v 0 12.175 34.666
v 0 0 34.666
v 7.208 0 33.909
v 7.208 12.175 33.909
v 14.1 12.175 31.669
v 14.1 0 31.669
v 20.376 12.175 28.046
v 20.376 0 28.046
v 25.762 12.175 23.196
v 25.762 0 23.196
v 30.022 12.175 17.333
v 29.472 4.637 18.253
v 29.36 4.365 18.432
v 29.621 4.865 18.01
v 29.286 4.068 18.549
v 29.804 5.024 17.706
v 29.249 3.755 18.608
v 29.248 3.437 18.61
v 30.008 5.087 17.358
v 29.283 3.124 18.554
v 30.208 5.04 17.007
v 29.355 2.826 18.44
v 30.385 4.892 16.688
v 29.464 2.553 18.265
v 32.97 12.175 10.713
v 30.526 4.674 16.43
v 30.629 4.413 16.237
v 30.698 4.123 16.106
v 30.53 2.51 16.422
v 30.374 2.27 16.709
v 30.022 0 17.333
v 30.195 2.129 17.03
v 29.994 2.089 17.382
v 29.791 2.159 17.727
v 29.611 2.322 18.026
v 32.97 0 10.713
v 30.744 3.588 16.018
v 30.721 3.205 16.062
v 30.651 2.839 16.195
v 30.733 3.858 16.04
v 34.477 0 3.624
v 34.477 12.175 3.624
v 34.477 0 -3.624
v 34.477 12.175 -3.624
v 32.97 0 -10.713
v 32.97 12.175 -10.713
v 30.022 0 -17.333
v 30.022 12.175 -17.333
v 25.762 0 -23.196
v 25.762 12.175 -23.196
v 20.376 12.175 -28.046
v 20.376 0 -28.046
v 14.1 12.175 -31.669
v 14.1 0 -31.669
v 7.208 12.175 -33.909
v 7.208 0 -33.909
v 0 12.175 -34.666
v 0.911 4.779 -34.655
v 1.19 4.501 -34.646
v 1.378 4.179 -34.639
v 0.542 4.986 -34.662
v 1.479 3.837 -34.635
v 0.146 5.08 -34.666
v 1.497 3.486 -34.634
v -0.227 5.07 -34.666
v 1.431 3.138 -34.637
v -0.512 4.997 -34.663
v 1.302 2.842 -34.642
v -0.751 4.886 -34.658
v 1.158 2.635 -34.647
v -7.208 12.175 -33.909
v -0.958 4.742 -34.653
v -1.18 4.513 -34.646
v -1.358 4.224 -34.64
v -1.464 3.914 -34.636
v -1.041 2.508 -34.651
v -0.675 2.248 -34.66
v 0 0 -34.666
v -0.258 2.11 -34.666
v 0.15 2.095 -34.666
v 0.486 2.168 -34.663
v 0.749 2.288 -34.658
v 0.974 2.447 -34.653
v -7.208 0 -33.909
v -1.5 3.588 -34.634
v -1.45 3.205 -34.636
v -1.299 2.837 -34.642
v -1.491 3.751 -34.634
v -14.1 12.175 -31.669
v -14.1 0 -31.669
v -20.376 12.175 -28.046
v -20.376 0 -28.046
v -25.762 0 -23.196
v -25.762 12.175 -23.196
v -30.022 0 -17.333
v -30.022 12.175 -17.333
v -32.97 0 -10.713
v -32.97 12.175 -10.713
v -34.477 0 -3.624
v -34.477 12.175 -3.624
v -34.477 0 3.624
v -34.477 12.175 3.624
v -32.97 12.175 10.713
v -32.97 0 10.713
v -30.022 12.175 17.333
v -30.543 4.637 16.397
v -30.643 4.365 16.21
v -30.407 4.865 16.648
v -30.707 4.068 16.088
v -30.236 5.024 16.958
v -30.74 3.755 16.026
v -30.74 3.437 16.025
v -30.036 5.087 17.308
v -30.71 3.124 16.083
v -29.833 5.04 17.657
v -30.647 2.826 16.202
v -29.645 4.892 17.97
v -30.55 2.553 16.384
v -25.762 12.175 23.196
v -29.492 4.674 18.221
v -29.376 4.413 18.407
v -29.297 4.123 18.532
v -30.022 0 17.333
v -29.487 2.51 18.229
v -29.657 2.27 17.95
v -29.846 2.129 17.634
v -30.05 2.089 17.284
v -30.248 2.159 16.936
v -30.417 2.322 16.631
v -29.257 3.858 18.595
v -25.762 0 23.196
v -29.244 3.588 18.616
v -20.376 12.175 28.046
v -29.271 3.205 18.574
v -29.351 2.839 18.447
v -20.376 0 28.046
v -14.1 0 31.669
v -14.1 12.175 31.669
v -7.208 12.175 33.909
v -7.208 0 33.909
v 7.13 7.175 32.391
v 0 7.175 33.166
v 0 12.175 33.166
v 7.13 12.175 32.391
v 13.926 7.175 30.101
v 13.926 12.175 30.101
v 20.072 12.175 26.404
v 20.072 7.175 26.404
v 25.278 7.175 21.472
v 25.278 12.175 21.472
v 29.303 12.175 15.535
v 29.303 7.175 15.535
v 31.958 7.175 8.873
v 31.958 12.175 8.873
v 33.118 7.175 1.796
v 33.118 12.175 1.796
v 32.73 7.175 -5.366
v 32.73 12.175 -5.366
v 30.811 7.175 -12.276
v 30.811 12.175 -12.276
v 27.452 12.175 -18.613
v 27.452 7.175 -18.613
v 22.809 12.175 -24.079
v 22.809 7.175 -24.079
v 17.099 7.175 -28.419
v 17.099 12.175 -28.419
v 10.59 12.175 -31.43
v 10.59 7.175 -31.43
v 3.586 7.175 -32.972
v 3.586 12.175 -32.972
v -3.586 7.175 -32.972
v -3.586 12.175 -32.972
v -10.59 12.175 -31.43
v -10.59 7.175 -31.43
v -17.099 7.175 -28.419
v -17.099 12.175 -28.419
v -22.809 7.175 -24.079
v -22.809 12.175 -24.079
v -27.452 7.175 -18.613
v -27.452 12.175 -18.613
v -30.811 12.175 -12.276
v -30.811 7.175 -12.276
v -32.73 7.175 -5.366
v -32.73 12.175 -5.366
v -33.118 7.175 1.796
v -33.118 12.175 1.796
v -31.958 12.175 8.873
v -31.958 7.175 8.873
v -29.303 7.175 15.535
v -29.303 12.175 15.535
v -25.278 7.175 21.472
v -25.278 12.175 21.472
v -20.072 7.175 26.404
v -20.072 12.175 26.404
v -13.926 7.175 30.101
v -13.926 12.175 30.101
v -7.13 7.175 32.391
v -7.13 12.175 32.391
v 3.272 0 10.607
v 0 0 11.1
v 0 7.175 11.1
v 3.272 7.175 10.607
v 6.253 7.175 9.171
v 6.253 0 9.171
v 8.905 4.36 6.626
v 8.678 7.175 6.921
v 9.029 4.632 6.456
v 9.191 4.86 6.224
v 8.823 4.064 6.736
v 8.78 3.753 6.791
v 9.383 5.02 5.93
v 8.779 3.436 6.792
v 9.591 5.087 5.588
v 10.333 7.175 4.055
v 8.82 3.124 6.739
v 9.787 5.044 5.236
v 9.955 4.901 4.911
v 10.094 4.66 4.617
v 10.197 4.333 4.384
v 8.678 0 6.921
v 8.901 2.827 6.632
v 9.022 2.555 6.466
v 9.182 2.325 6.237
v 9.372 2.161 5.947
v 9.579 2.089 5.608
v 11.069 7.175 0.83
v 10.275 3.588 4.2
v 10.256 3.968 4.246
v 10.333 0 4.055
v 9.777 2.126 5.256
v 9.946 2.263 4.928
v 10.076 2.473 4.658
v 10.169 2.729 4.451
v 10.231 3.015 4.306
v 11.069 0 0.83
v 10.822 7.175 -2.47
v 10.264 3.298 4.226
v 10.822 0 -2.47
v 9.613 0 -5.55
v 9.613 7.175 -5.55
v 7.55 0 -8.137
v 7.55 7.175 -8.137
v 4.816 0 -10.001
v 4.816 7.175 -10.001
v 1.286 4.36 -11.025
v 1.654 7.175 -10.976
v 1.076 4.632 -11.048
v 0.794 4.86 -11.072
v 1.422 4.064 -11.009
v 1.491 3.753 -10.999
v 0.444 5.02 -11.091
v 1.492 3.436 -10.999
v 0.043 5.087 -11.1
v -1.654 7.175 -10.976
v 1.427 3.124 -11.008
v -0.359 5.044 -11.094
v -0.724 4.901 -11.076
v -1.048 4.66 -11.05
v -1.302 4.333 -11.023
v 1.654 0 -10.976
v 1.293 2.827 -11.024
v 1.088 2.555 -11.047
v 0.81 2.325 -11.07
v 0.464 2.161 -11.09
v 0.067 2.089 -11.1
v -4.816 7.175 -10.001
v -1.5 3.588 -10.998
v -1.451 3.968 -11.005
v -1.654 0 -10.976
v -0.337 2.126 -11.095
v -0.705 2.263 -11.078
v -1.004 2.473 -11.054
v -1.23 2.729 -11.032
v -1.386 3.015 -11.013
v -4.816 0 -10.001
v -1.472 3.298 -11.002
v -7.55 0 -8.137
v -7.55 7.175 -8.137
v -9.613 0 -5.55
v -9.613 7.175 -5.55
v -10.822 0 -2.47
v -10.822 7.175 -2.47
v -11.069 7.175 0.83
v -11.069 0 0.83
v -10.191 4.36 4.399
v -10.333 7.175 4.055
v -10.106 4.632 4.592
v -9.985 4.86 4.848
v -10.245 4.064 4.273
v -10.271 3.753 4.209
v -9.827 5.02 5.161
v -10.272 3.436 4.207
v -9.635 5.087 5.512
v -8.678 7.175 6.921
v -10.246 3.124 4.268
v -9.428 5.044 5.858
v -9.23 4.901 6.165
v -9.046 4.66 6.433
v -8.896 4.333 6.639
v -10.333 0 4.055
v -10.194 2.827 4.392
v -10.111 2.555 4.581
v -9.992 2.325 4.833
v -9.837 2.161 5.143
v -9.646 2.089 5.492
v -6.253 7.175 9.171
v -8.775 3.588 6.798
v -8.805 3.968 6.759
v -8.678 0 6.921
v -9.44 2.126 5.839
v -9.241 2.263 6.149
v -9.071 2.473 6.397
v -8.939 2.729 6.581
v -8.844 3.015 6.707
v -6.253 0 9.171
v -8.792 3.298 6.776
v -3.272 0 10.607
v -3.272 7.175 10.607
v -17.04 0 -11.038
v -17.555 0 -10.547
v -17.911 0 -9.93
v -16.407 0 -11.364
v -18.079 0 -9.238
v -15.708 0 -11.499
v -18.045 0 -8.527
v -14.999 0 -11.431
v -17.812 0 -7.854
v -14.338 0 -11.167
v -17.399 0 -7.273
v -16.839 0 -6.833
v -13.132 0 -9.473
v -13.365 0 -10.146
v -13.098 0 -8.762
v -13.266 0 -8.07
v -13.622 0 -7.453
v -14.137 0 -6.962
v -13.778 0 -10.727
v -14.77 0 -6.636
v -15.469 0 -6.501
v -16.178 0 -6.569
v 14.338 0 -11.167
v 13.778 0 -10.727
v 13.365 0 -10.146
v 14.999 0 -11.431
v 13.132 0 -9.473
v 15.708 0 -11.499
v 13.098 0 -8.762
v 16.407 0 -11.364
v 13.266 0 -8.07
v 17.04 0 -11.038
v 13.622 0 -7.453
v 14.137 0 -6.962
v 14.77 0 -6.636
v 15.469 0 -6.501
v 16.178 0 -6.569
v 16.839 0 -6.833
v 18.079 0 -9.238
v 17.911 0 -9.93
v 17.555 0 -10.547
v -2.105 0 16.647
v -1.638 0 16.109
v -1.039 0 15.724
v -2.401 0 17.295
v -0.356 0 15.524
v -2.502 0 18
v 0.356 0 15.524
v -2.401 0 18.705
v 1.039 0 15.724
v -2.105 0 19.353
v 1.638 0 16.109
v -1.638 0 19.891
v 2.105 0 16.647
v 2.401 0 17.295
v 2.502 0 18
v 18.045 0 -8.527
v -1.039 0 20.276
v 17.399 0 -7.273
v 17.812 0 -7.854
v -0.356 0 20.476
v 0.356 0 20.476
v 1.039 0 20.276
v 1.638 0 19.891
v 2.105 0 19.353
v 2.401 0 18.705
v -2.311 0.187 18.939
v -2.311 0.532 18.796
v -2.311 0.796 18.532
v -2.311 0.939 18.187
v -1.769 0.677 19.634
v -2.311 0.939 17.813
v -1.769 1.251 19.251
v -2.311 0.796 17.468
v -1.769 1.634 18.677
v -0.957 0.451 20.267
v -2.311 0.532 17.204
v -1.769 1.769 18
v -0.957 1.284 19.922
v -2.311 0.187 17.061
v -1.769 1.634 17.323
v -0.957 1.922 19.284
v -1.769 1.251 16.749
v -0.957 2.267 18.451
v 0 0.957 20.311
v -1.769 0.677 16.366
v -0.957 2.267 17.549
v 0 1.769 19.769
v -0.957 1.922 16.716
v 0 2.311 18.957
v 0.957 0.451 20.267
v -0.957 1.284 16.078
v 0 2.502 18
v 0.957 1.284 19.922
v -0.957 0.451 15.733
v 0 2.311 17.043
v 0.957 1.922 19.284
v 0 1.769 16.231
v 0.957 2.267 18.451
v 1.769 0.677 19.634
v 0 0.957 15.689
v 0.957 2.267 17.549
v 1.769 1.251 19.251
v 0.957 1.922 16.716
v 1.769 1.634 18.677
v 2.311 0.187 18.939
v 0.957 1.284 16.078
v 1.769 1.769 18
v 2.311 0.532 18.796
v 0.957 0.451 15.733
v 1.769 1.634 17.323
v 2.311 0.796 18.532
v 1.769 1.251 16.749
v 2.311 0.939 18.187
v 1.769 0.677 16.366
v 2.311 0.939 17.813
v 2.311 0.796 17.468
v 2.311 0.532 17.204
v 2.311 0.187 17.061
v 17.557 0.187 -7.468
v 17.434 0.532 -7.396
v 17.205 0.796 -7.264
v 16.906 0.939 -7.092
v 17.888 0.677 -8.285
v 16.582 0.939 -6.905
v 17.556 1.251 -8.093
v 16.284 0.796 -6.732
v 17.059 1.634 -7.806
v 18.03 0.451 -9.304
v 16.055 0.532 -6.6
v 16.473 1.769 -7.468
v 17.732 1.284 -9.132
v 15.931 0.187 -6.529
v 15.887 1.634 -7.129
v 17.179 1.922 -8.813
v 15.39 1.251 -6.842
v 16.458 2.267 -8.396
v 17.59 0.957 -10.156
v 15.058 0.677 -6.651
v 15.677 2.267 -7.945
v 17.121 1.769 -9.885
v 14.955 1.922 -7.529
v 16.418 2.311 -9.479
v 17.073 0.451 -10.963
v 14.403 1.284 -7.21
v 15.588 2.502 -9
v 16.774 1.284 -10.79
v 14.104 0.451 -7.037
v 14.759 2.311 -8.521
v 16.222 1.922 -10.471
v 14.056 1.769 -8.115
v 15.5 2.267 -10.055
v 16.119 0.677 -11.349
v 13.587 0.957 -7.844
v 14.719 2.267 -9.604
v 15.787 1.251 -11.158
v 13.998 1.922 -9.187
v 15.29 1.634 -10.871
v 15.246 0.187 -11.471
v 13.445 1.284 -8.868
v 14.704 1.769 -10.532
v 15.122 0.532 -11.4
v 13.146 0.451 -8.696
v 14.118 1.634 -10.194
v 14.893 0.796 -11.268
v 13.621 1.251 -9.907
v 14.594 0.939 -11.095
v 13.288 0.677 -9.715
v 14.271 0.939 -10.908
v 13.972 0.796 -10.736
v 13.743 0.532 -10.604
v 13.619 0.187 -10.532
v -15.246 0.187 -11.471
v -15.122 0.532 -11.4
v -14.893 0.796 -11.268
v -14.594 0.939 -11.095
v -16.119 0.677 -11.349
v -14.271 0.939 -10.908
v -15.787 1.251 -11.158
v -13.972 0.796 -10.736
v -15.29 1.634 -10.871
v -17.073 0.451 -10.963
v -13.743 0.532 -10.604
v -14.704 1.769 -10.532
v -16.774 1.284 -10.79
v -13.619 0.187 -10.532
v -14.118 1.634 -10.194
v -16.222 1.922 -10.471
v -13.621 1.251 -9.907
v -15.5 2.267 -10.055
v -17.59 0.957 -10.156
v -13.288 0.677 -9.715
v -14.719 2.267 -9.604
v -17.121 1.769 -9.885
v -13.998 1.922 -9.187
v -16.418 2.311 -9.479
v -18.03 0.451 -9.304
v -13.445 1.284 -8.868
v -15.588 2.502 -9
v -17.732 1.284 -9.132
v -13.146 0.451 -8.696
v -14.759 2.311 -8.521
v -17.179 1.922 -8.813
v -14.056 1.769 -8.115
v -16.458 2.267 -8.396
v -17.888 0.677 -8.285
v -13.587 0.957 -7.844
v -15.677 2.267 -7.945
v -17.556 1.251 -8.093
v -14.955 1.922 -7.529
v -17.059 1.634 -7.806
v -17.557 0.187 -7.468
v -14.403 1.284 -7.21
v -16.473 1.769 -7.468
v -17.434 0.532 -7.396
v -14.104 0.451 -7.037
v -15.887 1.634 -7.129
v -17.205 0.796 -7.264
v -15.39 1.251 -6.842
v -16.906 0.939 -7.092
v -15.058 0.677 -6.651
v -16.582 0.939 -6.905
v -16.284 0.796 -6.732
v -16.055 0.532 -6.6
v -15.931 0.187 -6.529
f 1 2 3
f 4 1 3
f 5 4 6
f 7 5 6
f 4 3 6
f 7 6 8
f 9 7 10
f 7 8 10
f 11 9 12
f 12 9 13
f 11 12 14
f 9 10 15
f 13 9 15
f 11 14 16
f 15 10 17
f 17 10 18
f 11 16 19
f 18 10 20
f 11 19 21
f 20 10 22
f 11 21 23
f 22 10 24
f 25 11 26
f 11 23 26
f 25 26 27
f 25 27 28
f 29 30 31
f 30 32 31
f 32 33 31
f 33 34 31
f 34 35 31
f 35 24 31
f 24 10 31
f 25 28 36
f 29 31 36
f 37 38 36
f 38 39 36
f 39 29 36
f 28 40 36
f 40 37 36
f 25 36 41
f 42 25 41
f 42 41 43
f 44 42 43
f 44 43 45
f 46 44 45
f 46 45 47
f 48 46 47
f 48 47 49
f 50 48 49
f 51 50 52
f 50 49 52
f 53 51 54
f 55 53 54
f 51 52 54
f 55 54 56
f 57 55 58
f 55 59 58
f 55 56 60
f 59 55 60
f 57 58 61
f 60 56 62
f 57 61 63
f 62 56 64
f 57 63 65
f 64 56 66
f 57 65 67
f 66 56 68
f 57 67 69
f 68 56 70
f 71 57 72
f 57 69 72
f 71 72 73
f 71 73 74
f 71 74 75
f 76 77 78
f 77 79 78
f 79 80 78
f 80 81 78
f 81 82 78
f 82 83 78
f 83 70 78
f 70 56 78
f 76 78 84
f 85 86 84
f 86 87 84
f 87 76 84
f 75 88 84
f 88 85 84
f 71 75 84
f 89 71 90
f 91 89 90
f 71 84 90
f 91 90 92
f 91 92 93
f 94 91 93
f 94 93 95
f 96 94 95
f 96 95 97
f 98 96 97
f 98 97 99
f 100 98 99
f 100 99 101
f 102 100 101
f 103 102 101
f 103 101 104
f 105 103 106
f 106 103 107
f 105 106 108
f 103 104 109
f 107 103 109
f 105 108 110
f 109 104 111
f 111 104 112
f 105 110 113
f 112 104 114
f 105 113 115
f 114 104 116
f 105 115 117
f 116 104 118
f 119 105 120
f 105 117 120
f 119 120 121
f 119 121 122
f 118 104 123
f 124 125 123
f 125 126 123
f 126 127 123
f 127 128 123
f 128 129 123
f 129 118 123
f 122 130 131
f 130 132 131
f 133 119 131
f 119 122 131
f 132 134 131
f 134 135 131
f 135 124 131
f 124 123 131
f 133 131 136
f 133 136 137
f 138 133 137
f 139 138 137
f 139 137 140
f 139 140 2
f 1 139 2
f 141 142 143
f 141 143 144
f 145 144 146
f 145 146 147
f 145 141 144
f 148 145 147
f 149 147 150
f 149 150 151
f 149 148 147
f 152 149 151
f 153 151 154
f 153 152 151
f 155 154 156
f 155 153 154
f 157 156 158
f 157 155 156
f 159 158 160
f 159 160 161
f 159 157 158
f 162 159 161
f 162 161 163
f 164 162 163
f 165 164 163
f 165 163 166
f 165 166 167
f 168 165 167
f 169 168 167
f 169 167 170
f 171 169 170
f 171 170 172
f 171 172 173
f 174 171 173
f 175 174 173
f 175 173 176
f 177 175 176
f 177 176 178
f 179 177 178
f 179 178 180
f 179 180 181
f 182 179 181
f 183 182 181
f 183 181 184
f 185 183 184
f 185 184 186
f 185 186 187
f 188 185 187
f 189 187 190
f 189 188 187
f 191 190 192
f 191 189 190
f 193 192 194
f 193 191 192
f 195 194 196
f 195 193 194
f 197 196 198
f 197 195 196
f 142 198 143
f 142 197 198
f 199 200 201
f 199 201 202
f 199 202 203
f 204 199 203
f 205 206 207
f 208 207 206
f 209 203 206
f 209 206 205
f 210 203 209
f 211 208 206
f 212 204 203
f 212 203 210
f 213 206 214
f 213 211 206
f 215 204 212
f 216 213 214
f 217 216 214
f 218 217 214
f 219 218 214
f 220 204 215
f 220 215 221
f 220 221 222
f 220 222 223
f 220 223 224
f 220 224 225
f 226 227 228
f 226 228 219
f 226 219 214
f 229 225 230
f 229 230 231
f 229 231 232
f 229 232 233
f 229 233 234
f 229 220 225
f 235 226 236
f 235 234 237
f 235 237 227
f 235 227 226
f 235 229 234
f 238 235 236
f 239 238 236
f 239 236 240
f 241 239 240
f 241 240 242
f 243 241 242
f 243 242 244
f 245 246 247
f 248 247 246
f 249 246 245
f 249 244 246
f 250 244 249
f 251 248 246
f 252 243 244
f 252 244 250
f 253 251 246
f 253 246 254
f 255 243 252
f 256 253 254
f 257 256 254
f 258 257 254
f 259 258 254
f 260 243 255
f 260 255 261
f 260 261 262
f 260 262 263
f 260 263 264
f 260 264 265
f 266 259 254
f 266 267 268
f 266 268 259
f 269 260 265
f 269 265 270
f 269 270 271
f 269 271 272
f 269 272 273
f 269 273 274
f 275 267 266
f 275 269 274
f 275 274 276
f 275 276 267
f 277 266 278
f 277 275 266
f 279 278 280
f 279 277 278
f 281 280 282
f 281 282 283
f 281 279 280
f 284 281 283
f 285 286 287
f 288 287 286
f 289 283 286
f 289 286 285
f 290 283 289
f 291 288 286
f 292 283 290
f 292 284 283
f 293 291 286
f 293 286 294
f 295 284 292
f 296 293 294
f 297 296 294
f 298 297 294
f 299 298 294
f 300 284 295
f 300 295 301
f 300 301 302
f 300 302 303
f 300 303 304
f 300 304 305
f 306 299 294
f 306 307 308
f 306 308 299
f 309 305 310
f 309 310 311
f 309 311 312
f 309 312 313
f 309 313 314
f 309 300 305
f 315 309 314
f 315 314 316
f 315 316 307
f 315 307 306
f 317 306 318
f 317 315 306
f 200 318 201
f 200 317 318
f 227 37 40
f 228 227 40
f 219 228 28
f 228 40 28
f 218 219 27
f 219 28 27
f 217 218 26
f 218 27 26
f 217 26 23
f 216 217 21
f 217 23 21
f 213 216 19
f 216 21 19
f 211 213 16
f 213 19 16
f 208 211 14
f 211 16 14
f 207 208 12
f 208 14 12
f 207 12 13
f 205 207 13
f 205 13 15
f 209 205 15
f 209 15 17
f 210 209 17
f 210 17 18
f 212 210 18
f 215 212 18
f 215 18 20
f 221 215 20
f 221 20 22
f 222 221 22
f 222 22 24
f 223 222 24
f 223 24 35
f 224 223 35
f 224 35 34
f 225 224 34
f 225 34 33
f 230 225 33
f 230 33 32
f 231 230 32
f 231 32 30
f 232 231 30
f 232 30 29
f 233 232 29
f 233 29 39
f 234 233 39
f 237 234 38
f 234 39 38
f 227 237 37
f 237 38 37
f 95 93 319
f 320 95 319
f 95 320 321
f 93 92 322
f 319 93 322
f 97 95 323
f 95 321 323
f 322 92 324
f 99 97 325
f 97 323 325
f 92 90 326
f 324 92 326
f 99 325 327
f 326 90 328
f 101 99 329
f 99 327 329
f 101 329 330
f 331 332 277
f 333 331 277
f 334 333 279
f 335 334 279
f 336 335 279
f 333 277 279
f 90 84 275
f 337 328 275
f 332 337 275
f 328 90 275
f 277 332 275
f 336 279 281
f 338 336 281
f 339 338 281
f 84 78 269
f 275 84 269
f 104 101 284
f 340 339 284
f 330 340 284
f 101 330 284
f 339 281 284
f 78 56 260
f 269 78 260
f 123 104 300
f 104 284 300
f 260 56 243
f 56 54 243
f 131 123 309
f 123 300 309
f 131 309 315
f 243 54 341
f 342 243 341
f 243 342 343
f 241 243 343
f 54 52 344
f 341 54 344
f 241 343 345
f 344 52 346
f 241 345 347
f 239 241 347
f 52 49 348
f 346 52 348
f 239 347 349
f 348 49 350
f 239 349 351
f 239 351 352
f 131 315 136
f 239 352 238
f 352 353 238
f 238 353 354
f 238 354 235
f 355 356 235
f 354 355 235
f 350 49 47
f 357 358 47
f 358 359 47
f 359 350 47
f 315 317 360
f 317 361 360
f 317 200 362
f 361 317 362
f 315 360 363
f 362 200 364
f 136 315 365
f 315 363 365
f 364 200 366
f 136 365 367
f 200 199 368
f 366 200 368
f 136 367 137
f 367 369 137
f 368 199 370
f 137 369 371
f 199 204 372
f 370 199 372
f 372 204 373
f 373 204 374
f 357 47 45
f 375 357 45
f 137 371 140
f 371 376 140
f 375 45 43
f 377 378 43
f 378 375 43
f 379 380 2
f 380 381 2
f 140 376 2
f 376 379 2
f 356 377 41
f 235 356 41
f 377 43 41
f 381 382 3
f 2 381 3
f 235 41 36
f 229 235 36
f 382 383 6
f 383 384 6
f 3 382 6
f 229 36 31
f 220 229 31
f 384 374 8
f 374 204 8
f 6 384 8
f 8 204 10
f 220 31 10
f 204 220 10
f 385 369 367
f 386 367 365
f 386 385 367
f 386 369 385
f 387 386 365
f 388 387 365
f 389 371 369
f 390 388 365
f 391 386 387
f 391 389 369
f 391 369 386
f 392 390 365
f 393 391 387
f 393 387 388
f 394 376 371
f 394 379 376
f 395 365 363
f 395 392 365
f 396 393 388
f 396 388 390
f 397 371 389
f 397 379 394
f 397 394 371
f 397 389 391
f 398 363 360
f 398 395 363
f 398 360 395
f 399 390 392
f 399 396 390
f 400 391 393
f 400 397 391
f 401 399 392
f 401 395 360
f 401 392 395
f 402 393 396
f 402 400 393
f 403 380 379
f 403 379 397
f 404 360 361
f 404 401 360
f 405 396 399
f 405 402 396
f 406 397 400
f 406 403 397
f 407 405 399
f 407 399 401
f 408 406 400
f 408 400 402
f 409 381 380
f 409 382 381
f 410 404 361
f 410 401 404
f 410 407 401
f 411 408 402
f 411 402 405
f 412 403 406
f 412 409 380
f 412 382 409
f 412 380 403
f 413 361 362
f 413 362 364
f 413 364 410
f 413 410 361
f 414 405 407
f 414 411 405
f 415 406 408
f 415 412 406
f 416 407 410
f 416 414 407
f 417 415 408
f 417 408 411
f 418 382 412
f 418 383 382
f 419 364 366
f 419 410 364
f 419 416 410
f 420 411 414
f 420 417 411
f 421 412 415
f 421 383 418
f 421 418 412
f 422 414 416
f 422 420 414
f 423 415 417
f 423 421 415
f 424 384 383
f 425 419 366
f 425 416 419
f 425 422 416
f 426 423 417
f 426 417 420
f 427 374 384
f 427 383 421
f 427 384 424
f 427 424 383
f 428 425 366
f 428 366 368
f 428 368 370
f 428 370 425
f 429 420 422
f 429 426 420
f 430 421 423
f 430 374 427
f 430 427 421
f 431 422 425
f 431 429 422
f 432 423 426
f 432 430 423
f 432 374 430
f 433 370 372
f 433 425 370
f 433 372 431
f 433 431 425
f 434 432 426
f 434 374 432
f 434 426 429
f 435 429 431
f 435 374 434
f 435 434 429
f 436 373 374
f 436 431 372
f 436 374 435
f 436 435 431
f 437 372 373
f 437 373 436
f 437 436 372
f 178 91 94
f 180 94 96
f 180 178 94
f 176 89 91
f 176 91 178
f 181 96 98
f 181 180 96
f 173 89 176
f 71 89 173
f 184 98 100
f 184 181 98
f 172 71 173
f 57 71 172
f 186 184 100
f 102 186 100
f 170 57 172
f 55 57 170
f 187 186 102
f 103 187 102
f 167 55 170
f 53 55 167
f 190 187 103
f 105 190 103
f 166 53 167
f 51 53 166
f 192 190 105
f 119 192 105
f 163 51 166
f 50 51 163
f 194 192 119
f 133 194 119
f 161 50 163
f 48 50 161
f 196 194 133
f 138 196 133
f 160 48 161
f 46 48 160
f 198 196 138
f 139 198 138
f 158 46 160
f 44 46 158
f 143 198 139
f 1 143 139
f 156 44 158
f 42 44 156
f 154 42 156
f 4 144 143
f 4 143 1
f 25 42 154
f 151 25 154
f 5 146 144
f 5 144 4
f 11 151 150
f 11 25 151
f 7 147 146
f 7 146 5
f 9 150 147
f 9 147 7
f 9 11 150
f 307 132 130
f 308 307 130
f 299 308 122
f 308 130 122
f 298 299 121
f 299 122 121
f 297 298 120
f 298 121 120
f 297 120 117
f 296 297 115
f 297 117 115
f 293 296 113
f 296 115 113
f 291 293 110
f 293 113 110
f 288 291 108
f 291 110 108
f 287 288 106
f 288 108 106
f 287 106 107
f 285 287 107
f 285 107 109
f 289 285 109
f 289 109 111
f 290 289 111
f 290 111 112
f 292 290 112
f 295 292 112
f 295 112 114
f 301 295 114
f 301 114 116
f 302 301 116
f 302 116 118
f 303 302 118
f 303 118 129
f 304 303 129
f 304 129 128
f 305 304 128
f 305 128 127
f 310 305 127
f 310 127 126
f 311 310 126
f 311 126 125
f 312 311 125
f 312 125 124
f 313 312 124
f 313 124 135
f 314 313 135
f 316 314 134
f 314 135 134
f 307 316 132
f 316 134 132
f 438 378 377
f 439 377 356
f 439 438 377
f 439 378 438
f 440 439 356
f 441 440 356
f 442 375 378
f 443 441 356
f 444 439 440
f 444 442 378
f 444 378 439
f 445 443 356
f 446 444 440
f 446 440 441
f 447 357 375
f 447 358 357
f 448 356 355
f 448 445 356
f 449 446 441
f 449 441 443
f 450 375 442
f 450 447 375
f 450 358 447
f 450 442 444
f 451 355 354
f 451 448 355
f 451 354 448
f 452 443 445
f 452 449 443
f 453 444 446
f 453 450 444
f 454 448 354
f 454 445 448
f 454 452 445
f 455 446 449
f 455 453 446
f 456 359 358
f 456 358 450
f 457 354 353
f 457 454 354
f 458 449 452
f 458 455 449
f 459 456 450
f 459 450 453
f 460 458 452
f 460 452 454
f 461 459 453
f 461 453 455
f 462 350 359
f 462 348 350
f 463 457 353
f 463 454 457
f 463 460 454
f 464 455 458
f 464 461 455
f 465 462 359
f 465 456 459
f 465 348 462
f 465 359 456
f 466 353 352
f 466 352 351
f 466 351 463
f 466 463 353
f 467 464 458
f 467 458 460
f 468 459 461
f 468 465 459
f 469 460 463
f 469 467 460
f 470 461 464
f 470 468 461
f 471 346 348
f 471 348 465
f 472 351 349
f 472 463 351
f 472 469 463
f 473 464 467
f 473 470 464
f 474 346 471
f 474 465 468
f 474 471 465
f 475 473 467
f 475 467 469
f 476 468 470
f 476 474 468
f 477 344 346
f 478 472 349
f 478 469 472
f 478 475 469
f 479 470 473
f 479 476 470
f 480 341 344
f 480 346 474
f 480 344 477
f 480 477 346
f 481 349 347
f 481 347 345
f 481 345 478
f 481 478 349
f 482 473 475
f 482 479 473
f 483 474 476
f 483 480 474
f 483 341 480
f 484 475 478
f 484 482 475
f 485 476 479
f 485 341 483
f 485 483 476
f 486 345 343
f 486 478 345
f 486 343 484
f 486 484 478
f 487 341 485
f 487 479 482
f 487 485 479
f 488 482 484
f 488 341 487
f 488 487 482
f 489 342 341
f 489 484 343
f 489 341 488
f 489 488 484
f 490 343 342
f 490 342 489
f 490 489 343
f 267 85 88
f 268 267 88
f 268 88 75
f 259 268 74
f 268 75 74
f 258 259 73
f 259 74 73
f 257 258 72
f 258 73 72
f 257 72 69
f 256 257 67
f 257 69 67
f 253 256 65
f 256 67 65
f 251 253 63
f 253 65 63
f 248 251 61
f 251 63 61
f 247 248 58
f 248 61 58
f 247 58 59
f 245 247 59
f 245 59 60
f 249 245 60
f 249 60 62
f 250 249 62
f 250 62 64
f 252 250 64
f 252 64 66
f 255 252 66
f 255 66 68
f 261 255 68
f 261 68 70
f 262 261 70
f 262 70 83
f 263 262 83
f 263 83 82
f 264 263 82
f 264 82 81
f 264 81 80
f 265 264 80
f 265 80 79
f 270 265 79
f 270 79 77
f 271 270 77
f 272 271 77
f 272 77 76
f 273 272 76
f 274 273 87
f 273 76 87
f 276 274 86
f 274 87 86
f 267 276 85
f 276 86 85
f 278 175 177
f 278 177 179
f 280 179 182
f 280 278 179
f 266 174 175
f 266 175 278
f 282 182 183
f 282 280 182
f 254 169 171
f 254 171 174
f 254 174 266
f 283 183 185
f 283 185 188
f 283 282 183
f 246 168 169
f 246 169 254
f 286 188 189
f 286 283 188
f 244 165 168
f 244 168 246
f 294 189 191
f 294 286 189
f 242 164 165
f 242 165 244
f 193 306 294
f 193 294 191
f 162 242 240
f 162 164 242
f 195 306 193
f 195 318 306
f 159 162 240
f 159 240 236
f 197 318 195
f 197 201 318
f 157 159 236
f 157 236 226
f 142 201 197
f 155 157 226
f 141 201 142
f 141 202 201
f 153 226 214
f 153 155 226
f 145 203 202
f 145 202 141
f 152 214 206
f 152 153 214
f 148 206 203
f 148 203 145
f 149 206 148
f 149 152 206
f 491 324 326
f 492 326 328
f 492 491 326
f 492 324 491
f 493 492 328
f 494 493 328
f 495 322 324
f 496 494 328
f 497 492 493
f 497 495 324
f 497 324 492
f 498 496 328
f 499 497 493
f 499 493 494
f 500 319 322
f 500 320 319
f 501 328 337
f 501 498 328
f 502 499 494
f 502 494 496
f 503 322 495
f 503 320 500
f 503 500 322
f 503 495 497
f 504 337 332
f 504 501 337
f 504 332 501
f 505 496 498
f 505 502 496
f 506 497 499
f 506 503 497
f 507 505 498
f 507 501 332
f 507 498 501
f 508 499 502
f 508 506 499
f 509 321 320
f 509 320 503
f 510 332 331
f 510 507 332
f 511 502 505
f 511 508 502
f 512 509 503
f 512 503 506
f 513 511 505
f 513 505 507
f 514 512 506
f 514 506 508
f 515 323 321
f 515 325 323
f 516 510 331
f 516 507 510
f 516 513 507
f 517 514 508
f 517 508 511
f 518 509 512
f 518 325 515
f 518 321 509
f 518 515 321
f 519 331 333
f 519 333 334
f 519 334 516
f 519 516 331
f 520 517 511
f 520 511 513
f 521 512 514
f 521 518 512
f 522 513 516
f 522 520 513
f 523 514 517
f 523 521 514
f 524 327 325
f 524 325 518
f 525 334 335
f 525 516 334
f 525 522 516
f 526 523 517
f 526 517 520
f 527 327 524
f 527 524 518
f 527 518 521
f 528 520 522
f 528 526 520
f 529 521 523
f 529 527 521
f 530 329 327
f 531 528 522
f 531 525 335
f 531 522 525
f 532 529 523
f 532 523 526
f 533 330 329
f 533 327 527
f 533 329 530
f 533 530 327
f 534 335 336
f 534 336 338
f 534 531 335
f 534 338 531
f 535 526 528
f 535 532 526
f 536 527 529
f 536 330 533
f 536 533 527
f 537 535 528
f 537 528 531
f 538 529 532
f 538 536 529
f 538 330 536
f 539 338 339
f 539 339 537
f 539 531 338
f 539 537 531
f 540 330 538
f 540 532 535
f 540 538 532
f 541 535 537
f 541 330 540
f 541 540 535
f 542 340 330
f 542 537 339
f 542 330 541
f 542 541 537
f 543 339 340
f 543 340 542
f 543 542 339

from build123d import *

# Parameters (mm, degrees)
SKETCH2_R               = 33.1665
SKETCH2_R_2             = 11.1
BOSS_EXTRUDE1_DEPTH     = 7.175
SKETCH2_5_R             = 34.6665
SKETCH2_5_R_2           = 33.1665
BOSS_EXTRUDE2_DEPTH     = 12.175
CIRPATTERN1_COUNT       = 3
CUT_EXTRUDE3_REACH      = 85.886
CUT_EXTRUDE3_END_RADIUS = 11.1
SKETCH5_R               = 1.5
CIRPATTERN2_COUNT       = 3


with BuildPart() as part:
    # Sketch2 → Boss-Extrude1 (new body)
    with BuildSketch(Plane(origin=(0, 0, 0), x_dir=(1, 0, 0), z_dir=(0, 1, 0))):
        Circle(SKETCH2_R)
        Circle(SKETCH2_R_2, mode=Mode.SUBTRACT)
    extrude(amount=BOSS_EXTRUDE1_DEPTH)

    # Sketch2<5> → Boss-Extrude2 (add)
    with BuildSketch(Plane(origin=(0, 0, 0), x_dir=(1, 0, 0), z_dir=(0, 1, 0))):
        Circle(SKETCH2_5_R)
        Circle(SKETCH2_5_R_2, mode=Mode.SUBTRACT)
    extrude(amount=BOSS_EXTRUDE2_DEPTH)

    # Sketch3 → Cut-Revolve1 (revolve, cut)
    with BuildSketch(Plane.XZ):
        with BuildLine():
            Line((2.5019, 18), (-2.5019, 18))
            ThreePointArc((-2.5019, 18), (0, 15.4981), (2.5019, 18))
        make_face()
    cut_revolve1 = revolve(axis=Axis((3.292813159, 0, 18), (-1, 0, 0)), mode=Mode.SUBTRACT)

    # CirPattern1: Cut-Revolve1 ×3 about axis
    cirpattern1_axis = Axis((0, 0, 0), (0, 1, 0))
    for i in range(1, CIRPATTERN1_COUNT):
        add(cut_revolve1.rotate(cirpattern1_axis, i * 360 / CIRPATTERN1_COUNT), mode=Mode.SUBTRACT)

    # Cut-Extrude3: up to this cylinder (the profile starts outside it)
    cut_extrude3_end = Plane(origin=(0, 3.5875, 0), z_dir=(0, -1, 0)) * Cylinder(CUT_EXTRUDE3_END_RADIUS, 194.972, mode=Mode.PRIVATE)
    # Sketch5 → Cut-Extrude3 (cut, up to the surface)
    with BuildSketch(Plane(origin=(30.02206966, 0, 17.33325), x_dir=(0.4999999999999922, 0, -0.8660254037844431), z_dir=(0.8660254037844431, 0, 0.4999999999999922)), mode=Mode.PRIVATE) as cut_extrude3_sk1:
        with Locations((0, 3.5875)):
            Circle(SKETCH5_R)
    cut_extrude3_tool1 = extrude(cut_extrude3_sk1.sketch, amount=-CUT_EXTRUDE3_REACH, mode=Mode.PRIVATE) - cut_extrude3_end
    cut_extrude3 = cut_extrude3_tool1.solids().sort_by_distance((30.02207, 3.5875, 17.33325))[0]
    add(cut_extrude3, mode=Mode.SUBTRACT)

    # CirPattern2: Cut-Extrude3 ×3 about axis
    cirpattern2_axis = Axis((0, 12.175, 0), (0, -1, 0))
    for i in range(1, CIRPATTERN2_COUNT):
        add(cut_extrude3.rotate(cirpattern2_axis, i * 360 / CIRPATTERN2_COUNT), mode=Mode.SUBTRACT)


solid = part.part
